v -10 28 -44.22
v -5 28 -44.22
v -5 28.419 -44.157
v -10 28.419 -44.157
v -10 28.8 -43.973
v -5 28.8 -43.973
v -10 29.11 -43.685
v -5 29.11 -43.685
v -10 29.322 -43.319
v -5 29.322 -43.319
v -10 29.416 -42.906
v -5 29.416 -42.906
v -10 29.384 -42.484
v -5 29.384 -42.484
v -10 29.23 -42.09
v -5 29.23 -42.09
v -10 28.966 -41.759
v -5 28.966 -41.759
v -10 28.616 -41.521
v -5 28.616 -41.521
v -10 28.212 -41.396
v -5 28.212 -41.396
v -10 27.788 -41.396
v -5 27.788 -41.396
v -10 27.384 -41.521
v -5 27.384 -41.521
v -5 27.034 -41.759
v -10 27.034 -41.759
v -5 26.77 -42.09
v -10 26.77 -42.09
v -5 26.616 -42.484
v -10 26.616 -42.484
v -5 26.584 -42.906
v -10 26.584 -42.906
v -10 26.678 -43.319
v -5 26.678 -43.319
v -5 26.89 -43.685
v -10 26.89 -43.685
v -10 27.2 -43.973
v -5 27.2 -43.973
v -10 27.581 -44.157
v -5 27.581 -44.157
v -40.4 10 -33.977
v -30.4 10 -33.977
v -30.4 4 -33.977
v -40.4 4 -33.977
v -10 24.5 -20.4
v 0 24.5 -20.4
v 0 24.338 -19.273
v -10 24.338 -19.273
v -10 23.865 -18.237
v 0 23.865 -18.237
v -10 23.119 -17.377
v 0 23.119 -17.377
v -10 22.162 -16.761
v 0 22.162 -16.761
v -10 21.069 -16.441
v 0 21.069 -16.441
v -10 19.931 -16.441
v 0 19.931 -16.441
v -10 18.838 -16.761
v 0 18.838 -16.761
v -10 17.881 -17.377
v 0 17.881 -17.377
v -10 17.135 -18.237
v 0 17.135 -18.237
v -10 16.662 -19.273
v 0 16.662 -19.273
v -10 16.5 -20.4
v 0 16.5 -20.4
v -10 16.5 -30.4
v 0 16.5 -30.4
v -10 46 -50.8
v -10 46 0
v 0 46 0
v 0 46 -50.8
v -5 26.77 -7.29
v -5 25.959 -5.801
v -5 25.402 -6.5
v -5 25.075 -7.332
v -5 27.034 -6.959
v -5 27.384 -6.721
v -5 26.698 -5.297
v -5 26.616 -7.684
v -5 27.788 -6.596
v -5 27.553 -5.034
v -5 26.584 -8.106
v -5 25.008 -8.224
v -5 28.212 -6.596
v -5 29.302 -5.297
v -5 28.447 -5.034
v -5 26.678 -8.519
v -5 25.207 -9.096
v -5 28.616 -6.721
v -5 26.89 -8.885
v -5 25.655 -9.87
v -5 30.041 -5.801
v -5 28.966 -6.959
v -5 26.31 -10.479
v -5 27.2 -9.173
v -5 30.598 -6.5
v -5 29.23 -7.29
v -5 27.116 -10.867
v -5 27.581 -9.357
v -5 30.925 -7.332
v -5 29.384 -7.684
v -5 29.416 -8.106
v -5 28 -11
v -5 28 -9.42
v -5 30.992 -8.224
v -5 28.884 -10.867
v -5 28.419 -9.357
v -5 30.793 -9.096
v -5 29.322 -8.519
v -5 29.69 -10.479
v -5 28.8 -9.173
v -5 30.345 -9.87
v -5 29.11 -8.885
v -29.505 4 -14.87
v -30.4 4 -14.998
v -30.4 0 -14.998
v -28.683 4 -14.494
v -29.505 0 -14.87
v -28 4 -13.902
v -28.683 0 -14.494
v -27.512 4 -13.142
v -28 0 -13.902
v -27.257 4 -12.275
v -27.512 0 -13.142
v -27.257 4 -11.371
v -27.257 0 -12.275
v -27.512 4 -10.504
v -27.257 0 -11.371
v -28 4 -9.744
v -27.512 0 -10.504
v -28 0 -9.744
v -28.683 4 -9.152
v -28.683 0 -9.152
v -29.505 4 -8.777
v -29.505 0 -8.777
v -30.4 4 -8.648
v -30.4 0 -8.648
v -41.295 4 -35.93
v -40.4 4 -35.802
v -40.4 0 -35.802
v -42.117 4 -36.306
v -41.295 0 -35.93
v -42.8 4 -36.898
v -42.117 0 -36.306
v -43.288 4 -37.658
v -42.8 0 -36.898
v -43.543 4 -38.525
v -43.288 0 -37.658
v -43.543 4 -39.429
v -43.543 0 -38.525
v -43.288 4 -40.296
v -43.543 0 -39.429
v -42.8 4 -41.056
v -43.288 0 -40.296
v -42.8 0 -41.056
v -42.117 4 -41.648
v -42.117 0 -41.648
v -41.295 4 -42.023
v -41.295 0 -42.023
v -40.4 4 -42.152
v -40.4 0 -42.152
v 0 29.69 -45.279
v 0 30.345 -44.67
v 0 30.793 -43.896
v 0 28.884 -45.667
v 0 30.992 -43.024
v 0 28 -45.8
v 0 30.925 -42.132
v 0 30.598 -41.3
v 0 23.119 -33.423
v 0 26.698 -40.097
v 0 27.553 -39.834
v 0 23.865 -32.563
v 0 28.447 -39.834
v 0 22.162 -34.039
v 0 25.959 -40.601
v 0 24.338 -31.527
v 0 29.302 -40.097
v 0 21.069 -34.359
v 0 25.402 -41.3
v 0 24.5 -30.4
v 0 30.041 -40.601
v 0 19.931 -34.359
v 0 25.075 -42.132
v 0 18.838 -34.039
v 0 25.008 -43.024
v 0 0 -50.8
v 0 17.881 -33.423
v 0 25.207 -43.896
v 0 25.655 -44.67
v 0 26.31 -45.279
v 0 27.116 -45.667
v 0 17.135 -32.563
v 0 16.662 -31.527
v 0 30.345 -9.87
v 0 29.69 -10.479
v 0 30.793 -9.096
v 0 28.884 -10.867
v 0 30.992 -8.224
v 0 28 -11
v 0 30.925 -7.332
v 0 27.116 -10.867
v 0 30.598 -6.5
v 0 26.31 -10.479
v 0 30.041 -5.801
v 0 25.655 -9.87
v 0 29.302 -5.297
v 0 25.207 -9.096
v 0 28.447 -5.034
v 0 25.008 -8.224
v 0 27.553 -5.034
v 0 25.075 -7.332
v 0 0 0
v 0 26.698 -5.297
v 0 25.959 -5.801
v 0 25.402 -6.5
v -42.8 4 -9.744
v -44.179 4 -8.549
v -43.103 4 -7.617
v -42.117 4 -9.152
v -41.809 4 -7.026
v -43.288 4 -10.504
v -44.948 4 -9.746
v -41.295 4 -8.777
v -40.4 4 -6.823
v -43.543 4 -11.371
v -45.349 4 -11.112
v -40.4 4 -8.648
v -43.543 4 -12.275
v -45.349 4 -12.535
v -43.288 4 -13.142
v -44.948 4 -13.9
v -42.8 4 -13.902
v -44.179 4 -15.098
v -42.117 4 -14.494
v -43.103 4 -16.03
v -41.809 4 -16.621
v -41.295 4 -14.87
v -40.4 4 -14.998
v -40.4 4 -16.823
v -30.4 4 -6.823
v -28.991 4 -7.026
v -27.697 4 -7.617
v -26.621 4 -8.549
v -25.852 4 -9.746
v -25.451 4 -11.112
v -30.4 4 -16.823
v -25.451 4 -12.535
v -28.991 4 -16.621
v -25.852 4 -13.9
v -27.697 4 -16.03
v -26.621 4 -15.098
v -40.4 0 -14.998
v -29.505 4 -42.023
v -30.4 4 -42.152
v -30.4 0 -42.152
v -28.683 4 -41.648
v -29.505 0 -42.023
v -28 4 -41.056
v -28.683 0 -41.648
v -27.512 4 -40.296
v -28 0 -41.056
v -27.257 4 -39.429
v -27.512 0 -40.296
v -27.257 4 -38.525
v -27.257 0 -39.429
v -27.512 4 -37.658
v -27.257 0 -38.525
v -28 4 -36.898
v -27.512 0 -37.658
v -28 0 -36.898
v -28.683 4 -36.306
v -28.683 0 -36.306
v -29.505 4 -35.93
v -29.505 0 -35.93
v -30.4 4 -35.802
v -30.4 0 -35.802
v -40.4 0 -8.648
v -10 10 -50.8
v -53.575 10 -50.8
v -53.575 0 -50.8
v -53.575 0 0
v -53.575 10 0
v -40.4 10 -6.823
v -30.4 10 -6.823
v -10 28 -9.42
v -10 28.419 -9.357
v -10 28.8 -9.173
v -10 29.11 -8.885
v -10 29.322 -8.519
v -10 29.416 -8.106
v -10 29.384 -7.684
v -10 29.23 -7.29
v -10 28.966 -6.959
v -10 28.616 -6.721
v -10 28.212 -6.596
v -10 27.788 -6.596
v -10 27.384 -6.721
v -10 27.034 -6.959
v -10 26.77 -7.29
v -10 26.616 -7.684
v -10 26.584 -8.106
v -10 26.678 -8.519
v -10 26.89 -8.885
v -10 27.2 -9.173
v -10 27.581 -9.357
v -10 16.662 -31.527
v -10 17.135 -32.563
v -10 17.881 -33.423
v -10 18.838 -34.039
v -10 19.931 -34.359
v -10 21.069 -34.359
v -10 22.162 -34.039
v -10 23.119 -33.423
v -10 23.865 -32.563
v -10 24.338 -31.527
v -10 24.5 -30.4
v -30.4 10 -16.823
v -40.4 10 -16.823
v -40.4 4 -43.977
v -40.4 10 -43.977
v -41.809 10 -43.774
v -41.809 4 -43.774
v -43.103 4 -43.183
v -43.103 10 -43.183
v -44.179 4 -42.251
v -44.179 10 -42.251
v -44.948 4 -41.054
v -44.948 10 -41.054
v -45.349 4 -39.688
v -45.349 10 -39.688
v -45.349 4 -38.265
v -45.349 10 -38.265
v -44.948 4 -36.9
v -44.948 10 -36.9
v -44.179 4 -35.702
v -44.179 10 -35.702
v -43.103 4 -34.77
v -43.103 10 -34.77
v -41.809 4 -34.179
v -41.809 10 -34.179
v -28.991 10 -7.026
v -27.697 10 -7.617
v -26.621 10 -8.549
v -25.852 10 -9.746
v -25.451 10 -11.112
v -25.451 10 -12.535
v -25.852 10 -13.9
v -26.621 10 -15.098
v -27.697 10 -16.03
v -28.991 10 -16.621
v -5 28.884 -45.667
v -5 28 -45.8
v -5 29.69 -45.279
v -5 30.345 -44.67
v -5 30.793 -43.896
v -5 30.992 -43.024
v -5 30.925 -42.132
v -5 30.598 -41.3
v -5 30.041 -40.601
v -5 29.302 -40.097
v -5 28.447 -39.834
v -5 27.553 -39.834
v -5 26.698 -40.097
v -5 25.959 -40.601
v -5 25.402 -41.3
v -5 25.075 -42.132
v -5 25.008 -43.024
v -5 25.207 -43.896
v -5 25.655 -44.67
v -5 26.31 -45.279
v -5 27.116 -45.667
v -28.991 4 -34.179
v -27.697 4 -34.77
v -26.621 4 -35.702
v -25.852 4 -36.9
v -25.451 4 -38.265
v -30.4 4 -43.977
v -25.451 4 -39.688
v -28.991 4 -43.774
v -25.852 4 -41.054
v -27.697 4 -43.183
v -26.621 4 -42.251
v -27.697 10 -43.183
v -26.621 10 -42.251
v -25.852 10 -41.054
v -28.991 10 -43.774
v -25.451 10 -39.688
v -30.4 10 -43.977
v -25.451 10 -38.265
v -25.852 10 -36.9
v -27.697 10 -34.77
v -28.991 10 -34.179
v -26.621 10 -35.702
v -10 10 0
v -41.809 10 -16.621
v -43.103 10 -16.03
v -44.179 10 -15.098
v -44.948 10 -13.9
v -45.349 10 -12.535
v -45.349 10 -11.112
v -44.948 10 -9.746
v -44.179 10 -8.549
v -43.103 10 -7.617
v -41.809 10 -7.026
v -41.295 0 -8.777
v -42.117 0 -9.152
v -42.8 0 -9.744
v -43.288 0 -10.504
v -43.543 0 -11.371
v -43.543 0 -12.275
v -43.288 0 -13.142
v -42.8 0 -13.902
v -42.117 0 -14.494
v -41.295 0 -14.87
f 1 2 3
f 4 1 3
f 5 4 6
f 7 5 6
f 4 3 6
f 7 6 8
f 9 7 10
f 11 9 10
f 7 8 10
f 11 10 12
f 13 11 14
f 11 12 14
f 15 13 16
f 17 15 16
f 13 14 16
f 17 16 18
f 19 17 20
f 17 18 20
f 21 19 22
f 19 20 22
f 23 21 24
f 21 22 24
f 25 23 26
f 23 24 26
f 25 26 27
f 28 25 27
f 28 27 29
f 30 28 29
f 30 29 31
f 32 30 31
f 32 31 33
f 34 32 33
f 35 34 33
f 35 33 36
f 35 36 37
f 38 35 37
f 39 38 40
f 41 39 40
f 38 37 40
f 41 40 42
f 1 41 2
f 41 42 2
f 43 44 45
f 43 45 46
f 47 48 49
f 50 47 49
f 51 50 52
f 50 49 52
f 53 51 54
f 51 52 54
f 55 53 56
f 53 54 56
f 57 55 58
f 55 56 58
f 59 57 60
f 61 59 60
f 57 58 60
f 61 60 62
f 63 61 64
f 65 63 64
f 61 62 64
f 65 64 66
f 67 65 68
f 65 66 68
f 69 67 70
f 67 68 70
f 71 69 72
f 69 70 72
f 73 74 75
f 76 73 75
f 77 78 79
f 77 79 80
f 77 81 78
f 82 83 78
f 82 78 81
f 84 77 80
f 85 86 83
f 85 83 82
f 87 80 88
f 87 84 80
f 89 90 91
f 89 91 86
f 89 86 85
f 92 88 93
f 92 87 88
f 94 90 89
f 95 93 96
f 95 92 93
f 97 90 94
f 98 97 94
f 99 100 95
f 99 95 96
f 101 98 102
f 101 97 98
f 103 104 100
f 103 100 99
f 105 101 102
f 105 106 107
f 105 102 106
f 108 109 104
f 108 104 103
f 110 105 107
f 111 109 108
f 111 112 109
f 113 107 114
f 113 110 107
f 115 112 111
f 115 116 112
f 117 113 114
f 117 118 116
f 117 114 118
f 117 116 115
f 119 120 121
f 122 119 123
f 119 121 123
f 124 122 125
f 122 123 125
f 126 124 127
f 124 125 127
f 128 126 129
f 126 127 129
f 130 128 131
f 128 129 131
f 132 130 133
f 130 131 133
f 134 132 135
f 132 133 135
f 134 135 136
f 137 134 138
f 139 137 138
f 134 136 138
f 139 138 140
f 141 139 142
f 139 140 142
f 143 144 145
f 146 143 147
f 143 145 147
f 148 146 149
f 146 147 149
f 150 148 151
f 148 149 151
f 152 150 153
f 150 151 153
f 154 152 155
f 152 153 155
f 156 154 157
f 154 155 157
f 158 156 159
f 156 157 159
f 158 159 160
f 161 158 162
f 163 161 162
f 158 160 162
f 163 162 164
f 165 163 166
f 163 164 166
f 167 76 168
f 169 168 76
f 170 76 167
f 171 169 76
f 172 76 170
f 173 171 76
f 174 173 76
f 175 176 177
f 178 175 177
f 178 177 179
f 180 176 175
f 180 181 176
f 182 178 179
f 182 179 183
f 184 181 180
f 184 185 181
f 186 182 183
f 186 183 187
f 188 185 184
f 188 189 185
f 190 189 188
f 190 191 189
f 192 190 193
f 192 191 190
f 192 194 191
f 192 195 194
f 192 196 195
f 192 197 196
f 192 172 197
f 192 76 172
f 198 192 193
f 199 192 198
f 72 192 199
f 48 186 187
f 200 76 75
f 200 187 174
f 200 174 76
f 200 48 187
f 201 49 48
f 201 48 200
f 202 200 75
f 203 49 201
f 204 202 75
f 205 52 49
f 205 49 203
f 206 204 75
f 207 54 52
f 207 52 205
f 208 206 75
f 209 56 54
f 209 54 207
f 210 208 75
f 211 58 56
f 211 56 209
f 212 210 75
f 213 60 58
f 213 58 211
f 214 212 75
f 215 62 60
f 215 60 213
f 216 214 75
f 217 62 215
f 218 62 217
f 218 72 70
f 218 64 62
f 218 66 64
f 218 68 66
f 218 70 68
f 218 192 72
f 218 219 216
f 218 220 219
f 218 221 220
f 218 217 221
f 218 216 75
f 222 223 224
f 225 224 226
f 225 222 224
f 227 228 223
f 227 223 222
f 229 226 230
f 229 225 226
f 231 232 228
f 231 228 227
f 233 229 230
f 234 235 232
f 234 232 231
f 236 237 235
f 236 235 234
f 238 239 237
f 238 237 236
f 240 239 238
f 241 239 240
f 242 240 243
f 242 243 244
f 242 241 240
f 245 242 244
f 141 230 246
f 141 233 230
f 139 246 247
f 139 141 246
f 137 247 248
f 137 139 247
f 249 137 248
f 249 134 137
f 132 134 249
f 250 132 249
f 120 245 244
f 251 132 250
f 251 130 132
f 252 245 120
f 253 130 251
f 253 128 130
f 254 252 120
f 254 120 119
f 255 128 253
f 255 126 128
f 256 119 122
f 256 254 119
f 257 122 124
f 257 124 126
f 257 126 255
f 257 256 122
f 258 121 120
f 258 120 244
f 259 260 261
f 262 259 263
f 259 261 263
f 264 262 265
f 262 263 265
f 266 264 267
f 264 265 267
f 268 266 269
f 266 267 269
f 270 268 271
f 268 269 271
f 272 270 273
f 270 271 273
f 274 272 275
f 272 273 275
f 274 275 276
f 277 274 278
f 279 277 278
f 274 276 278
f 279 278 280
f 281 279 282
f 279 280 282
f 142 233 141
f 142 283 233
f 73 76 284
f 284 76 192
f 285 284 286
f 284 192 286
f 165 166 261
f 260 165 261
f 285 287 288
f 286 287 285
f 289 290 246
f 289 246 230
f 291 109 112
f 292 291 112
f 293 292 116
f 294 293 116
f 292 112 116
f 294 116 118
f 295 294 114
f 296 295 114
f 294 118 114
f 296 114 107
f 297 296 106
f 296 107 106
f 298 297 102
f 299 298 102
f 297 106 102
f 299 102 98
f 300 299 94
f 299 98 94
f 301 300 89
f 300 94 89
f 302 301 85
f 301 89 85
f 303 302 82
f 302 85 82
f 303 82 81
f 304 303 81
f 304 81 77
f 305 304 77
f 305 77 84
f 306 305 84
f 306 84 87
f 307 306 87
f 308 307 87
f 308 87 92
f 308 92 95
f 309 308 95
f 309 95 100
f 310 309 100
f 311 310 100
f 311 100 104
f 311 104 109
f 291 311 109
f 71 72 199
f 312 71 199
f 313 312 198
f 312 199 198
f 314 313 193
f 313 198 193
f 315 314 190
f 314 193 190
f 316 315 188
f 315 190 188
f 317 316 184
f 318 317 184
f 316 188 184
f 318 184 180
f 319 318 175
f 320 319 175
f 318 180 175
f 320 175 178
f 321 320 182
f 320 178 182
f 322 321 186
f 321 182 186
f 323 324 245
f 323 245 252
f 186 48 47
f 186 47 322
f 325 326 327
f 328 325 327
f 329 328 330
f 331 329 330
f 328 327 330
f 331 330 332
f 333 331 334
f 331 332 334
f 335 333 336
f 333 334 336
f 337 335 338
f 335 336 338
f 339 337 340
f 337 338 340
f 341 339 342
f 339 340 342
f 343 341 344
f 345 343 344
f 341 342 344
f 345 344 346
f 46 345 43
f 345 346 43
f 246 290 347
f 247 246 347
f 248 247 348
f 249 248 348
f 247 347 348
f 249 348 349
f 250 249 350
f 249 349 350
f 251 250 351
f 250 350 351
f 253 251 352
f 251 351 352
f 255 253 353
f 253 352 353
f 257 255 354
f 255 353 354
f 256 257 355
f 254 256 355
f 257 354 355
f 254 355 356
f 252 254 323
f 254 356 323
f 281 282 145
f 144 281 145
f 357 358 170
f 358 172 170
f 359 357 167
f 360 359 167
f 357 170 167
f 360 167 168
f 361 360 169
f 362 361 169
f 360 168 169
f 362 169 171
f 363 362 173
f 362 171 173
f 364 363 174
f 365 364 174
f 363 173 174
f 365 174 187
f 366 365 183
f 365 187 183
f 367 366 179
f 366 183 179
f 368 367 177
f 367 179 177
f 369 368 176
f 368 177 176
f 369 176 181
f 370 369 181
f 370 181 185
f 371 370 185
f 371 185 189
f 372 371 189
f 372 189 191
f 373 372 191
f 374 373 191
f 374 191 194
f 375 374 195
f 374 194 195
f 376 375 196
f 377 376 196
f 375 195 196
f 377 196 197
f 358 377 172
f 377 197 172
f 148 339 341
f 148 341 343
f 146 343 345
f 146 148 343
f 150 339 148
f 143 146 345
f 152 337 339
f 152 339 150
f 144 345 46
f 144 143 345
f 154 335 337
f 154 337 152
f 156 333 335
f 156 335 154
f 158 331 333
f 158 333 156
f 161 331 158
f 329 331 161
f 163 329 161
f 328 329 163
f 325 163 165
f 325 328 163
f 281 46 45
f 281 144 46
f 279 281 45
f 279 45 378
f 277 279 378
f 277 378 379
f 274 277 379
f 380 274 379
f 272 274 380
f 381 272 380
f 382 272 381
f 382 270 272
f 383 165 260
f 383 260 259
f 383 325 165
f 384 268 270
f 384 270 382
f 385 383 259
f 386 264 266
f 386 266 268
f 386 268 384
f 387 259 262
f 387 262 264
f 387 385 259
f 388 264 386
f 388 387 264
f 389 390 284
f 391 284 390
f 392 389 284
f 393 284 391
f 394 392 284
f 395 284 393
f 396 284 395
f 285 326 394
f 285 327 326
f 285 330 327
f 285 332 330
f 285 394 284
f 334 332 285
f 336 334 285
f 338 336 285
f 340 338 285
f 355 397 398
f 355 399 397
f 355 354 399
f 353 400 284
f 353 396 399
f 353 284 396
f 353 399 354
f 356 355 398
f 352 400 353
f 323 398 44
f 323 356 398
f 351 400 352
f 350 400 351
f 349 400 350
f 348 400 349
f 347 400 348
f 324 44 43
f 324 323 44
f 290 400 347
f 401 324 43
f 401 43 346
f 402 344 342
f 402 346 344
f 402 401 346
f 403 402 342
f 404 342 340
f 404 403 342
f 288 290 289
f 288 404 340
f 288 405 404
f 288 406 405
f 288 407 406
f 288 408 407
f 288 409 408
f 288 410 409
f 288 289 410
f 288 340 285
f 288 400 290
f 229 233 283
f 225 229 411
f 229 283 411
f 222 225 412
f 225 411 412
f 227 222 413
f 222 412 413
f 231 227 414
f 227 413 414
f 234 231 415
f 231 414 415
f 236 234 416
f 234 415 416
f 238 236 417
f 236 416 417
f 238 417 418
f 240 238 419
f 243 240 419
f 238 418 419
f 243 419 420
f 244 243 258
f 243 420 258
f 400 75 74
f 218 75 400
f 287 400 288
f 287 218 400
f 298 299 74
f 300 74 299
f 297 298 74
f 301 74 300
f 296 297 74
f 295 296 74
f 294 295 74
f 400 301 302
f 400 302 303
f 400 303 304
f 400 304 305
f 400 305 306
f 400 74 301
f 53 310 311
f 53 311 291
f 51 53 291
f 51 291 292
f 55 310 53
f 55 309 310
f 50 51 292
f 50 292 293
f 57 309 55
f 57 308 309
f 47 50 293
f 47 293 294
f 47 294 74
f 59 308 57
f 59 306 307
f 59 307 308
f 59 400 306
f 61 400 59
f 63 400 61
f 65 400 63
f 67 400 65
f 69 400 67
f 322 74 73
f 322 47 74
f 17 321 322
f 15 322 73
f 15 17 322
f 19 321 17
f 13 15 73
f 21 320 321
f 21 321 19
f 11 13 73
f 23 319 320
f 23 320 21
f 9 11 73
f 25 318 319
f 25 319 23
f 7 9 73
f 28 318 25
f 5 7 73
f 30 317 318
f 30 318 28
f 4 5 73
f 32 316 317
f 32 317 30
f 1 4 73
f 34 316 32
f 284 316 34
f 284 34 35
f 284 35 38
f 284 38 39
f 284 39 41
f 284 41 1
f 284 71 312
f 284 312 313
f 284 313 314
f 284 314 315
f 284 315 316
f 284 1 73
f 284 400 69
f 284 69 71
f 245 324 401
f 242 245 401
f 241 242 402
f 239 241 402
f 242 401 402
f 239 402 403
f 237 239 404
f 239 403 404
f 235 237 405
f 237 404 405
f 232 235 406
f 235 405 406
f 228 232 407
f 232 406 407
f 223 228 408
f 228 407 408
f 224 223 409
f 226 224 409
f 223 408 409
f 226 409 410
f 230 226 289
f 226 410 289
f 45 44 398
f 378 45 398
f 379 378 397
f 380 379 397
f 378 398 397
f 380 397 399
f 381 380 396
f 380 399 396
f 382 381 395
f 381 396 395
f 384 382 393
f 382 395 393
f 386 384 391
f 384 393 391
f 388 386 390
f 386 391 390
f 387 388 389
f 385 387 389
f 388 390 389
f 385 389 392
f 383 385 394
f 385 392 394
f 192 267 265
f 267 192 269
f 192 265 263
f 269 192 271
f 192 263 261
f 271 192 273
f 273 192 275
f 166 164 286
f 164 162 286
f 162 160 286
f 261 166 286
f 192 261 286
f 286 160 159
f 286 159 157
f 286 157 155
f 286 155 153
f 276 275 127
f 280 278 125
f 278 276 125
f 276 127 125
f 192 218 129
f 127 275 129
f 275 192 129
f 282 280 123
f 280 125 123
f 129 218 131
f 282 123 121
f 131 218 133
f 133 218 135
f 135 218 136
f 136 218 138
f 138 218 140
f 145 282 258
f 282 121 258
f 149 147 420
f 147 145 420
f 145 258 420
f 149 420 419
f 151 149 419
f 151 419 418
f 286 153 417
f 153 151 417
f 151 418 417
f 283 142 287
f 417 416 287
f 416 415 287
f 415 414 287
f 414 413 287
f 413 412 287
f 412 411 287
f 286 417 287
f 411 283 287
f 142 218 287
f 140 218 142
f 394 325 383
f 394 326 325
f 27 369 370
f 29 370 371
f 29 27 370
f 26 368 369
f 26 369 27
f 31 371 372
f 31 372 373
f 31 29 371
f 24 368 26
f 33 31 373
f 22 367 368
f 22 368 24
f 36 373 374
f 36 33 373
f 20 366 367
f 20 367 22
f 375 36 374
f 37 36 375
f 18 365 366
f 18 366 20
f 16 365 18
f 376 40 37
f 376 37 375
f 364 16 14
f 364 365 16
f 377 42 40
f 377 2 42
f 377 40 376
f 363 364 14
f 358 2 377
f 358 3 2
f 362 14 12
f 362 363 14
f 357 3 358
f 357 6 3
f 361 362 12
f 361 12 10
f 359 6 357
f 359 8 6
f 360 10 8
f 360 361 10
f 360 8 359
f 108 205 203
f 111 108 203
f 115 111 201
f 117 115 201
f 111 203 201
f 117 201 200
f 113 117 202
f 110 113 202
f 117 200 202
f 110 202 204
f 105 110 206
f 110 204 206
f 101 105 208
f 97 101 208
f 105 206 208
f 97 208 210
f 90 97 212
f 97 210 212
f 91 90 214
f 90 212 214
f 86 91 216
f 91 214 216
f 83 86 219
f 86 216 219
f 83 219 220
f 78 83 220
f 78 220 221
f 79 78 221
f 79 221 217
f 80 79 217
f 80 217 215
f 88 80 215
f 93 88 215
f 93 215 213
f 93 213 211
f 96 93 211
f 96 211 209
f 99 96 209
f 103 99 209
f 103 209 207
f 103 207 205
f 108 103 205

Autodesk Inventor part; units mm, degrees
ref_plane "YZ Plane" through (0, 0, 0) normal (1, 0, 0) x (0, 1, 0)
ref_plane "XZ Plane" through (0, 0, 0) normal (0, 1, 0) x (-1, 0, 0)
ref_plane "XY Plane" through (0, 0, 0) normal (0, 0, 1) x (1, 0, 0)
sketch "Sketch1" plane through (0, 0, 0) normal (0, 1, 0) x (-1, 0, 0)
  line L0 (0, 0) -> (53.575, 0)
  line L1 (53.575, 0) -> (53.575, -50.8)
  line L2 (53.575, -50.8) -> (0, -50.8)
  line L3 (0, -50.8) -> (0, 0)
  line L4 (10, 0) -> (10, -50.8)
  arc A0 (30.4, -35.8017) -> (30.4, -42.1517) centre (30.4, -38.9767) ccw
  arc A1 (40.4, -42.1517) -> (40.4, -35.8017) centre (40.4, -38.9767) ccw
  line L5 (30.4, -35.8017) -> (40.4, -35.8017)
  line L6 (40.4, -42.1517) -> (30.4, -42.1517)
  line L7 (-7.5059, -25.4) -> (68.7329, -25.4)
  arc A2 (30.4, -8.6483) -> (30.4, -14.9983) centre (30.4, -11.8233) ccw
  arc A3 (40.4, -14.9983) -> (40.4, -8.6483) centre (40.4, -11.8233) ccw
  line L8 (30.4, -14.9983) -> (40.4, -14.9983)
  line L9 (40.4, -8.6483) -> (30.4, -8.6483)
  dimension "d0" = 50.8
  dimension "d2" = 10
  dimension "d3" = 6.35
  dimension "d4" = 6.35
  dimension "d6" = 10
  dimension "d7" = 20.4
  dimension "d8" = 13.175
  dimension "d9" = 25.4
extrude "Extrusion1" add sketch "Sketch1" along normal blind 10
sketch "Sketch2" plane through (0, 10, 0) normal (0, 1, 0) x (1, 0, 0)
  line L0 (0, 50.8) -> (-53.575, 50.8) projected
  line L1 (0, 0) -> (-10, 0)
  line L2 (-10, 0) -> (-10, 50.8)
  line L3 (-10, 50.8) -> (0, 50.8)
  line L4 (0, 50.8) -> (0, 0)
  dimension "d12" = 10
extrude "Extrusion2" add sketch "Sketch2" along normal blind 36
sketch "Sketch3" plane through (0, 0, 0) normal (1, 0, 0) x (0, 0, -1)
  line L0 (0, 10) -> (50.8, 10) projected
  circle A0 centre (8, 28) radius 1.42
  circle A1 centre (42.8, 28) radius 1.42
  line L1 (50.8, 0) -> (50.8, 46) projected
  line L2 (0, 0) -> (0, 46) projected
  line L3 (0, 0) -> (50.8, 0) projected
  line L4 (50.8, 0) -> (50.8, 46) projected
  line L5 (0, 46) -> (50.8, 46) projected
  line L6 (0, 0) -> (0, 46) projected
  arc A2 (20.4, 24.5) -> (20.4, 16.5) centre (20.4, 20.5) ccw
  arc A3 (30.4, 16.5) -> (30.4, 24.5) centre (30.4, 20.5) ccw
  line L7 (20.4, 24.5) -> (30.4, 24.5)
  line L8 (20.4, 16.5) -> (30.4, 16.5)
  line L9 (20.4, 20.5) -> (25.4, 20.5)
  point P0 (50.8, 23)
  point P1 (25.4, 10)
  dimension "d15" = 2.84
  dimension "d16" = 2.84
  dimension "d17" = 34.8
  dimension "d18" = 0
  dimension "d19" = 18
  dimension "d20" = 8
  dimension "d21" = 8
  dimension "d22" = 50.8
  dimension "d35" = 8
  dimension "d36" = 8
  dimension "d37" = 0
  dimension "d38" = 10
  dimension "d39" = 5
  dimension "d40" = 25.4
  dimension "d41" = 10.5
extrude "Extrusion3" cut sketch "Sketch3" against normal blind 36 contours A0 | A1 | L7 A3 L8 A2
sketch "Sketch4" plane through (0, 10, 0) normal (0, 1, 0) x (1, 0, 0)
  arc A0 (-40.4, 42.1517) -> (-40.4, 35.8017) centre (-40.4, 38.9767) ccw projected
  arc A1 (-40.4, 43.9767) -> (-40.4, 33.9767) centre (-40.4, 38.9767) ccw
  arc A2 (-30.4, 35.8017) -> (-30.4, 42.1517) centre (-30.4, 38.9767) ccw projected
  arc A3 (-30.4, 33.9767) -> (-30.4, 43.9767) centre (-30.4, 38.9767) ccw
  line L0 (-10, 0) -> (-10, 50.8) projected
  line L1 (-10, 50.8) -> (-53.575, 50.8) projected
  line L2 (-53.575, 50.8) -> (-53.575, 0) projected
  line L3 (-53.575, 0) -> (-10, 0) projected
  line L4 (-40.4, 14.9983) -> (-30.4, 14.9983) projected
  arc A4 (-30.4, 8.6483) -> (-30.4, 14.9983) centre (-30.4, 11.8233) ccw projected
  line L5 (-30.4, 8.6483) -> (-40.4, 8.6483) projected
  arc A5 (-40.4, 14.9983) -> (-40.4, 8.6483) centre (-40.4, 11.8233) ccw projected
  line L6 (-40.4, 42.1517) -> (-30.4, 42.1517) projected
  arc A6 (-30.4, 35.8017) -> (-30.4, 42.1517) centre (-30.4, 38.9767) ccw projected
  line L7 (-30.4, 35.8017) -> (-40.4, 35.8017) projected
  arc A7 (-40.4, 42.1517) -> (-40.4, 35.8017) centre (-40.4, 38.9767) ccw projected
  arc A8 (-40.4, 16.8233) -> (-40.4, 6.8233) centre (-40.4, 11.8233) ccw
  arc A9 (-30.4, 6.8233) -> (-30.4, 16.8233) centre (-30.4, 11.8233) ccw
  line L8 (-30.4, 6.8233) -> (-40.4, 6.8233)
  line L9 (-40.4, 16.8233) -> (-30.4, 16.8233)
  line L10 (-30.4, 33.9767) -> (-40.4, 33.9767)
  line L11 (-40.4, 43.9767) -> (-30.4, 43.9767)
  point P0 (0, 0)
  dimension "d25" = 10
  dimension "d26" = 10
  dimension "d27" = 10
  dimension "d28" = 10
extrude "Extrusion4" cut sketch "Sketch4" against normal blind 6 contours L6 A2 L7 A0 | L11 A3 L10 A1 | L4 A4 L5 A5 | L9 A9 L8 A8
sketch "Sketch5" plane through (0, 0, 0) normal (1, 0, 0) x (0, 0, -1)
  circle A0 centre (42.8, 28) radius 1.42 projected
  circle A1 centre (8, 28) radius 1.42 projected
  line L0 (0, 0) -> (50.8, 0) projected
  line L1 (50.8, 0) -> (50.8, 46) projected
  line L2 (0, 46) -> (50.8, 46) projected
  line L3 (0, 0) -> (0, 46) projected
  circle A2 centre (8, 28) radius 3
  circle A3 centre (42.8, 28) radius 1.42 projected
  circle A4 centre (42.8, 28) radius 3
  dimension "d31" = 6
  dimension "d32" = 6
extrude "Extrusion5" cut sketch "Sketch5" against normal blind 5 contours A1 | A2 | A4
equation "\"d4\" = d3"
equation "\"d9\" = 0.5 * d0"
equation "\"d12\" = d2"
equation "\"d16\" = d15"
equation "\"d20\" = -0.5 * d17 + 0.5 * d22"
equation "\"d36\" = d35"
equation "\"d39\" = 0.5 * d38"
equation "\"d40\" = 0.5 * d22"
equation "\"d26\" = d25"
equation "\"d27\" = d25"
equation "\"d28\" = d25"
equation "\"d32\" = d31"
properties part number "Actuator Stage End Cap"
